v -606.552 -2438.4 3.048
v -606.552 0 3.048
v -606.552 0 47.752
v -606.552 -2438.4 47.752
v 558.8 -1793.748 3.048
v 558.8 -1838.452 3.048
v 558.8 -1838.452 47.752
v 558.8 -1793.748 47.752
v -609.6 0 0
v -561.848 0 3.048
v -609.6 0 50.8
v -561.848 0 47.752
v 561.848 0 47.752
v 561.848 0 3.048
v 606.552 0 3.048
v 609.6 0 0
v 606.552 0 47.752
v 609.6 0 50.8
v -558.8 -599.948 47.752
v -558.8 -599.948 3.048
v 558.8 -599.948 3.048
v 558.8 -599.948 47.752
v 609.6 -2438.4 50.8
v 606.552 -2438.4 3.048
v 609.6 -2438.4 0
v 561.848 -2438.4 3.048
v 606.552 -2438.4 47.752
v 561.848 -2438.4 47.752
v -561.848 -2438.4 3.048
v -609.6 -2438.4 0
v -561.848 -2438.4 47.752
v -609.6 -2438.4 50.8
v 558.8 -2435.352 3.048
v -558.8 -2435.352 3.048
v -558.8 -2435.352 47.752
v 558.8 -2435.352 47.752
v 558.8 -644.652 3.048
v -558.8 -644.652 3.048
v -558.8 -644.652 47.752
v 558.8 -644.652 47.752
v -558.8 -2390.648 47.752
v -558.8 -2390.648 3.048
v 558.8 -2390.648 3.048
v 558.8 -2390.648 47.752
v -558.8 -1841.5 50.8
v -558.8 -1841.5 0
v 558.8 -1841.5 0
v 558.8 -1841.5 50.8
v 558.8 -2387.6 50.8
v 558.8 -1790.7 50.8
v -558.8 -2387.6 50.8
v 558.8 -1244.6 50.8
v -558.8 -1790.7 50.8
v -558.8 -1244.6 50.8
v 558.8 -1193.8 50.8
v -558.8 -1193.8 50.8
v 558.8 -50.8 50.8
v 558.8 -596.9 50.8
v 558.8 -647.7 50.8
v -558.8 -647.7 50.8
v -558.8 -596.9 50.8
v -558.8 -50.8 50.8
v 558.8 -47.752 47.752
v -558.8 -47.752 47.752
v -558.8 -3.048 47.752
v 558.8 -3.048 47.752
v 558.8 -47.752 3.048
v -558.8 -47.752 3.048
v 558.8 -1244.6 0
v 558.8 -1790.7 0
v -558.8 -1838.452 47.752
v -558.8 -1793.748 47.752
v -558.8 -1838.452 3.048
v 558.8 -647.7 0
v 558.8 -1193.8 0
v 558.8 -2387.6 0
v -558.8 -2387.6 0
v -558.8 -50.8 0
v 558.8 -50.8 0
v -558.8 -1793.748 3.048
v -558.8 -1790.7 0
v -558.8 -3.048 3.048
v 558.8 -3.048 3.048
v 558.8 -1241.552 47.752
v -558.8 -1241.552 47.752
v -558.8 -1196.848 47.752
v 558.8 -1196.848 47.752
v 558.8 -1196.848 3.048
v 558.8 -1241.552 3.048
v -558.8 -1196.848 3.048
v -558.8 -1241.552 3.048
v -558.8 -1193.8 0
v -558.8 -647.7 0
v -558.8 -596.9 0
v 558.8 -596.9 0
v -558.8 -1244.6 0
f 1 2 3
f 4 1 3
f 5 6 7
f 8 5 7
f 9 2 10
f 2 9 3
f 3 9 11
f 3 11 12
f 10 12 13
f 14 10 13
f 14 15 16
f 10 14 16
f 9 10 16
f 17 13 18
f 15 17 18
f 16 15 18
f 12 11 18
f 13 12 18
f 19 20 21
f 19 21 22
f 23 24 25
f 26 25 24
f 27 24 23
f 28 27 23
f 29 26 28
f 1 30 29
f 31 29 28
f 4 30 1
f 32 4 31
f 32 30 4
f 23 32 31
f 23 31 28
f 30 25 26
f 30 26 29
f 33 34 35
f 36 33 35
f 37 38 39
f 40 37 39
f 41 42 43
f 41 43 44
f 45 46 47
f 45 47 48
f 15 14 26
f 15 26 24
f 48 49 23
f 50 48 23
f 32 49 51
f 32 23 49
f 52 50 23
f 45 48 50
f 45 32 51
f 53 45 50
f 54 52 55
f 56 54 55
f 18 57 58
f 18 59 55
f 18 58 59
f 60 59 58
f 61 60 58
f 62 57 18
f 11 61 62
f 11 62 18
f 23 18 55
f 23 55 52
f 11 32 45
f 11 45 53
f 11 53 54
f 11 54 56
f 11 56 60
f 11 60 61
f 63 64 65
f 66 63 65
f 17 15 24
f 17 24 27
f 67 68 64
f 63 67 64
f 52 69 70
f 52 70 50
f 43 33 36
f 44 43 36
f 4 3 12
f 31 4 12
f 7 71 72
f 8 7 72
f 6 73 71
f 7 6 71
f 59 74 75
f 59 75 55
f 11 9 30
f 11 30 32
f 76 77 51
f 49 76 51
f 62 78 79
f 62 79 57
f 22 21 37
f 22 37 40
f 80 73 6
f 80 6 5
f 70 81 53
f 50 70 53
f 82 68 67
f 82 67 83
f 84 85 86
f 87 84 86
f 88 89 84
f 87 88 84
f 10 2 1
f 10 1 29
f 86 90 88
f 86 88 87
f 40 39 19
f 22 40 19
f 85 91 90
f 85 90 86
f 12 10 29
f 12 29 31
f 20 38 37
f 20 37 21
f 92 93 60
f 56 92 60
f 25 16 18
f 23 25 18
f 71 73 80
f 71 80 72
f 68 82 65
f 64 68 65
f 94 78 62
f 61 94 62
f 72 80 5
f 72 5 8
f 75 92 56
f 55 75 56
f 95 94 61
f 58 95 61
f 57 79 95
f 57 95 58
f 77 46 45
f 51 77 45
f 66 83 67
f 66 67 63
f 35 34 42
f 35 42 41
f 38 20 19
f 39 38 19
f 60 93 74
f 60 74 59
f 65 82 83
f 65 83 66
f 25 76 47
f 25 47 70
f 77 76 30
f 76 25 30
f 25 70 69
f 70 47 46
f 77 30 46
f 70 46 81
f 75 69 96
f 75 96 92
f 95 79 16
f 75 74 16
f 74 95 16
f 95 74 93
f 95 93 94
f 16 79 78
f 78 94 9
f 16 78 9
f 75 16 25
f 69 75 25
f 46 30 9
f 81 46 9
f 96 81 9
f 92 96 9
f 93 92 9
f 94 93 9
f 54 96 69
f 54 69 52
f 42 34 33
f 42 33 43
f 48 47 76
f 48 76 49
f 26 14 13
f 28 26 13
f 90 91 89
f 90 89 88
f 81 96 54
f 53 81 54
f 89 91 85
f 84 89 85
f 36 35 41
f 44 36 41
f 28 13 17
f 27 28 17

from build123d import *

# Parameters (mm, degrees)
F0_W     = 44.704
F0_H     = 44.704
F0_W_2   = 50.8
F0_H_2   = 50.8
F1_DEPTH = 2438.4
F2_DEPTH = 2438.4
F3_W     = 50.8
F3_H     = 50.8
F3_W_2   = 44.704
F3_H_2   = 44.704
F4_DEPTH = 1117.6


with BuildPart() as f1:
    # F0 (on Front) → F1 (new body)
    with BuildSketch(Plane.XZ):
        with Locations((-584.2, 25.4)):
            Rectangle(F0_W, F0_H)
        with Locations((-584.2, 25.4)):
            Rectangle(F0_W_2, F0_H_2)
        with Locations((-584.2, 25.4)):
            Rectangle(F0_W, F0_H, mode=Mode.SUBTRACT)
        with Locations((584.2, 25.4)):
            Rectangle(F0_W, F0_H)
        with Locations((584.2, 25.4)):
            Rectangle(F0_W_2, F0_H_2)
        with Locations((584.2, 25.4)):
            Rectangle(F0_W, F0_H, mode=Mode.SUBTRACT)
    extrude(amount=F1_DEPTH)

    # F0 (on Front) → F2 (cut)
    with BuildSketch(Plane.XZ):
        with Locations((-584.2, 25.4)):
            Rectangle(F0_W, F0_H)
        with Locations((584.2, 25.4)):
            Rectangle(F0_W, F0_H)
    extrude(amount=F2_DEPTH, mode=Mode.SUBTRACT)

    # F3 (on face) → F4 (join, through all)
    with BuildSketch(Plane.YZ.offset(-558.8)):
        with Locations((-2413, 25.4)):
            Rectangle(F3_W, F3_H)
        with Locations((-2413, 25.4)):
            Rectangle(F3_W_2, F3_H_2, mode=Mode.SUBTRACT)
        with Locations((-1816.1, 25.4)):
            Rectangle(F3_W, F3_H)
        with Locations((-1816.1, 25.4)):
            Rectangle(F3_W_2, F3_H_2, mode=Mode.SUBTRACT)
        with Locations((-1219.2, 25.4)):
            Rectangle(F3_W, F3_H)
        with Locations((-1219.2, 25.4)):
            Rectangle(F3_W_2, F3_H_2, mode=Mode.SUBTRACT)
        with Locations((-622.3, 25.4)):
            Rectangle(F3_W, F3_H)
        with Locations((-622.3, 25.4)):
            Rectangle(F3_W_2, F3_H_2, mode=Mode.SUBTRACT)
        with Locations((-25.4, 25.4)):
            Rectangle(F3_W, F3_H)
        with Locations((-25.4, 25.4)):
            Rectangle(F3_W_2, F3_H_2, mode=Mode.SUBTRACT)
    extrude(amount=F4_DEPTH)


solid = f1.part
